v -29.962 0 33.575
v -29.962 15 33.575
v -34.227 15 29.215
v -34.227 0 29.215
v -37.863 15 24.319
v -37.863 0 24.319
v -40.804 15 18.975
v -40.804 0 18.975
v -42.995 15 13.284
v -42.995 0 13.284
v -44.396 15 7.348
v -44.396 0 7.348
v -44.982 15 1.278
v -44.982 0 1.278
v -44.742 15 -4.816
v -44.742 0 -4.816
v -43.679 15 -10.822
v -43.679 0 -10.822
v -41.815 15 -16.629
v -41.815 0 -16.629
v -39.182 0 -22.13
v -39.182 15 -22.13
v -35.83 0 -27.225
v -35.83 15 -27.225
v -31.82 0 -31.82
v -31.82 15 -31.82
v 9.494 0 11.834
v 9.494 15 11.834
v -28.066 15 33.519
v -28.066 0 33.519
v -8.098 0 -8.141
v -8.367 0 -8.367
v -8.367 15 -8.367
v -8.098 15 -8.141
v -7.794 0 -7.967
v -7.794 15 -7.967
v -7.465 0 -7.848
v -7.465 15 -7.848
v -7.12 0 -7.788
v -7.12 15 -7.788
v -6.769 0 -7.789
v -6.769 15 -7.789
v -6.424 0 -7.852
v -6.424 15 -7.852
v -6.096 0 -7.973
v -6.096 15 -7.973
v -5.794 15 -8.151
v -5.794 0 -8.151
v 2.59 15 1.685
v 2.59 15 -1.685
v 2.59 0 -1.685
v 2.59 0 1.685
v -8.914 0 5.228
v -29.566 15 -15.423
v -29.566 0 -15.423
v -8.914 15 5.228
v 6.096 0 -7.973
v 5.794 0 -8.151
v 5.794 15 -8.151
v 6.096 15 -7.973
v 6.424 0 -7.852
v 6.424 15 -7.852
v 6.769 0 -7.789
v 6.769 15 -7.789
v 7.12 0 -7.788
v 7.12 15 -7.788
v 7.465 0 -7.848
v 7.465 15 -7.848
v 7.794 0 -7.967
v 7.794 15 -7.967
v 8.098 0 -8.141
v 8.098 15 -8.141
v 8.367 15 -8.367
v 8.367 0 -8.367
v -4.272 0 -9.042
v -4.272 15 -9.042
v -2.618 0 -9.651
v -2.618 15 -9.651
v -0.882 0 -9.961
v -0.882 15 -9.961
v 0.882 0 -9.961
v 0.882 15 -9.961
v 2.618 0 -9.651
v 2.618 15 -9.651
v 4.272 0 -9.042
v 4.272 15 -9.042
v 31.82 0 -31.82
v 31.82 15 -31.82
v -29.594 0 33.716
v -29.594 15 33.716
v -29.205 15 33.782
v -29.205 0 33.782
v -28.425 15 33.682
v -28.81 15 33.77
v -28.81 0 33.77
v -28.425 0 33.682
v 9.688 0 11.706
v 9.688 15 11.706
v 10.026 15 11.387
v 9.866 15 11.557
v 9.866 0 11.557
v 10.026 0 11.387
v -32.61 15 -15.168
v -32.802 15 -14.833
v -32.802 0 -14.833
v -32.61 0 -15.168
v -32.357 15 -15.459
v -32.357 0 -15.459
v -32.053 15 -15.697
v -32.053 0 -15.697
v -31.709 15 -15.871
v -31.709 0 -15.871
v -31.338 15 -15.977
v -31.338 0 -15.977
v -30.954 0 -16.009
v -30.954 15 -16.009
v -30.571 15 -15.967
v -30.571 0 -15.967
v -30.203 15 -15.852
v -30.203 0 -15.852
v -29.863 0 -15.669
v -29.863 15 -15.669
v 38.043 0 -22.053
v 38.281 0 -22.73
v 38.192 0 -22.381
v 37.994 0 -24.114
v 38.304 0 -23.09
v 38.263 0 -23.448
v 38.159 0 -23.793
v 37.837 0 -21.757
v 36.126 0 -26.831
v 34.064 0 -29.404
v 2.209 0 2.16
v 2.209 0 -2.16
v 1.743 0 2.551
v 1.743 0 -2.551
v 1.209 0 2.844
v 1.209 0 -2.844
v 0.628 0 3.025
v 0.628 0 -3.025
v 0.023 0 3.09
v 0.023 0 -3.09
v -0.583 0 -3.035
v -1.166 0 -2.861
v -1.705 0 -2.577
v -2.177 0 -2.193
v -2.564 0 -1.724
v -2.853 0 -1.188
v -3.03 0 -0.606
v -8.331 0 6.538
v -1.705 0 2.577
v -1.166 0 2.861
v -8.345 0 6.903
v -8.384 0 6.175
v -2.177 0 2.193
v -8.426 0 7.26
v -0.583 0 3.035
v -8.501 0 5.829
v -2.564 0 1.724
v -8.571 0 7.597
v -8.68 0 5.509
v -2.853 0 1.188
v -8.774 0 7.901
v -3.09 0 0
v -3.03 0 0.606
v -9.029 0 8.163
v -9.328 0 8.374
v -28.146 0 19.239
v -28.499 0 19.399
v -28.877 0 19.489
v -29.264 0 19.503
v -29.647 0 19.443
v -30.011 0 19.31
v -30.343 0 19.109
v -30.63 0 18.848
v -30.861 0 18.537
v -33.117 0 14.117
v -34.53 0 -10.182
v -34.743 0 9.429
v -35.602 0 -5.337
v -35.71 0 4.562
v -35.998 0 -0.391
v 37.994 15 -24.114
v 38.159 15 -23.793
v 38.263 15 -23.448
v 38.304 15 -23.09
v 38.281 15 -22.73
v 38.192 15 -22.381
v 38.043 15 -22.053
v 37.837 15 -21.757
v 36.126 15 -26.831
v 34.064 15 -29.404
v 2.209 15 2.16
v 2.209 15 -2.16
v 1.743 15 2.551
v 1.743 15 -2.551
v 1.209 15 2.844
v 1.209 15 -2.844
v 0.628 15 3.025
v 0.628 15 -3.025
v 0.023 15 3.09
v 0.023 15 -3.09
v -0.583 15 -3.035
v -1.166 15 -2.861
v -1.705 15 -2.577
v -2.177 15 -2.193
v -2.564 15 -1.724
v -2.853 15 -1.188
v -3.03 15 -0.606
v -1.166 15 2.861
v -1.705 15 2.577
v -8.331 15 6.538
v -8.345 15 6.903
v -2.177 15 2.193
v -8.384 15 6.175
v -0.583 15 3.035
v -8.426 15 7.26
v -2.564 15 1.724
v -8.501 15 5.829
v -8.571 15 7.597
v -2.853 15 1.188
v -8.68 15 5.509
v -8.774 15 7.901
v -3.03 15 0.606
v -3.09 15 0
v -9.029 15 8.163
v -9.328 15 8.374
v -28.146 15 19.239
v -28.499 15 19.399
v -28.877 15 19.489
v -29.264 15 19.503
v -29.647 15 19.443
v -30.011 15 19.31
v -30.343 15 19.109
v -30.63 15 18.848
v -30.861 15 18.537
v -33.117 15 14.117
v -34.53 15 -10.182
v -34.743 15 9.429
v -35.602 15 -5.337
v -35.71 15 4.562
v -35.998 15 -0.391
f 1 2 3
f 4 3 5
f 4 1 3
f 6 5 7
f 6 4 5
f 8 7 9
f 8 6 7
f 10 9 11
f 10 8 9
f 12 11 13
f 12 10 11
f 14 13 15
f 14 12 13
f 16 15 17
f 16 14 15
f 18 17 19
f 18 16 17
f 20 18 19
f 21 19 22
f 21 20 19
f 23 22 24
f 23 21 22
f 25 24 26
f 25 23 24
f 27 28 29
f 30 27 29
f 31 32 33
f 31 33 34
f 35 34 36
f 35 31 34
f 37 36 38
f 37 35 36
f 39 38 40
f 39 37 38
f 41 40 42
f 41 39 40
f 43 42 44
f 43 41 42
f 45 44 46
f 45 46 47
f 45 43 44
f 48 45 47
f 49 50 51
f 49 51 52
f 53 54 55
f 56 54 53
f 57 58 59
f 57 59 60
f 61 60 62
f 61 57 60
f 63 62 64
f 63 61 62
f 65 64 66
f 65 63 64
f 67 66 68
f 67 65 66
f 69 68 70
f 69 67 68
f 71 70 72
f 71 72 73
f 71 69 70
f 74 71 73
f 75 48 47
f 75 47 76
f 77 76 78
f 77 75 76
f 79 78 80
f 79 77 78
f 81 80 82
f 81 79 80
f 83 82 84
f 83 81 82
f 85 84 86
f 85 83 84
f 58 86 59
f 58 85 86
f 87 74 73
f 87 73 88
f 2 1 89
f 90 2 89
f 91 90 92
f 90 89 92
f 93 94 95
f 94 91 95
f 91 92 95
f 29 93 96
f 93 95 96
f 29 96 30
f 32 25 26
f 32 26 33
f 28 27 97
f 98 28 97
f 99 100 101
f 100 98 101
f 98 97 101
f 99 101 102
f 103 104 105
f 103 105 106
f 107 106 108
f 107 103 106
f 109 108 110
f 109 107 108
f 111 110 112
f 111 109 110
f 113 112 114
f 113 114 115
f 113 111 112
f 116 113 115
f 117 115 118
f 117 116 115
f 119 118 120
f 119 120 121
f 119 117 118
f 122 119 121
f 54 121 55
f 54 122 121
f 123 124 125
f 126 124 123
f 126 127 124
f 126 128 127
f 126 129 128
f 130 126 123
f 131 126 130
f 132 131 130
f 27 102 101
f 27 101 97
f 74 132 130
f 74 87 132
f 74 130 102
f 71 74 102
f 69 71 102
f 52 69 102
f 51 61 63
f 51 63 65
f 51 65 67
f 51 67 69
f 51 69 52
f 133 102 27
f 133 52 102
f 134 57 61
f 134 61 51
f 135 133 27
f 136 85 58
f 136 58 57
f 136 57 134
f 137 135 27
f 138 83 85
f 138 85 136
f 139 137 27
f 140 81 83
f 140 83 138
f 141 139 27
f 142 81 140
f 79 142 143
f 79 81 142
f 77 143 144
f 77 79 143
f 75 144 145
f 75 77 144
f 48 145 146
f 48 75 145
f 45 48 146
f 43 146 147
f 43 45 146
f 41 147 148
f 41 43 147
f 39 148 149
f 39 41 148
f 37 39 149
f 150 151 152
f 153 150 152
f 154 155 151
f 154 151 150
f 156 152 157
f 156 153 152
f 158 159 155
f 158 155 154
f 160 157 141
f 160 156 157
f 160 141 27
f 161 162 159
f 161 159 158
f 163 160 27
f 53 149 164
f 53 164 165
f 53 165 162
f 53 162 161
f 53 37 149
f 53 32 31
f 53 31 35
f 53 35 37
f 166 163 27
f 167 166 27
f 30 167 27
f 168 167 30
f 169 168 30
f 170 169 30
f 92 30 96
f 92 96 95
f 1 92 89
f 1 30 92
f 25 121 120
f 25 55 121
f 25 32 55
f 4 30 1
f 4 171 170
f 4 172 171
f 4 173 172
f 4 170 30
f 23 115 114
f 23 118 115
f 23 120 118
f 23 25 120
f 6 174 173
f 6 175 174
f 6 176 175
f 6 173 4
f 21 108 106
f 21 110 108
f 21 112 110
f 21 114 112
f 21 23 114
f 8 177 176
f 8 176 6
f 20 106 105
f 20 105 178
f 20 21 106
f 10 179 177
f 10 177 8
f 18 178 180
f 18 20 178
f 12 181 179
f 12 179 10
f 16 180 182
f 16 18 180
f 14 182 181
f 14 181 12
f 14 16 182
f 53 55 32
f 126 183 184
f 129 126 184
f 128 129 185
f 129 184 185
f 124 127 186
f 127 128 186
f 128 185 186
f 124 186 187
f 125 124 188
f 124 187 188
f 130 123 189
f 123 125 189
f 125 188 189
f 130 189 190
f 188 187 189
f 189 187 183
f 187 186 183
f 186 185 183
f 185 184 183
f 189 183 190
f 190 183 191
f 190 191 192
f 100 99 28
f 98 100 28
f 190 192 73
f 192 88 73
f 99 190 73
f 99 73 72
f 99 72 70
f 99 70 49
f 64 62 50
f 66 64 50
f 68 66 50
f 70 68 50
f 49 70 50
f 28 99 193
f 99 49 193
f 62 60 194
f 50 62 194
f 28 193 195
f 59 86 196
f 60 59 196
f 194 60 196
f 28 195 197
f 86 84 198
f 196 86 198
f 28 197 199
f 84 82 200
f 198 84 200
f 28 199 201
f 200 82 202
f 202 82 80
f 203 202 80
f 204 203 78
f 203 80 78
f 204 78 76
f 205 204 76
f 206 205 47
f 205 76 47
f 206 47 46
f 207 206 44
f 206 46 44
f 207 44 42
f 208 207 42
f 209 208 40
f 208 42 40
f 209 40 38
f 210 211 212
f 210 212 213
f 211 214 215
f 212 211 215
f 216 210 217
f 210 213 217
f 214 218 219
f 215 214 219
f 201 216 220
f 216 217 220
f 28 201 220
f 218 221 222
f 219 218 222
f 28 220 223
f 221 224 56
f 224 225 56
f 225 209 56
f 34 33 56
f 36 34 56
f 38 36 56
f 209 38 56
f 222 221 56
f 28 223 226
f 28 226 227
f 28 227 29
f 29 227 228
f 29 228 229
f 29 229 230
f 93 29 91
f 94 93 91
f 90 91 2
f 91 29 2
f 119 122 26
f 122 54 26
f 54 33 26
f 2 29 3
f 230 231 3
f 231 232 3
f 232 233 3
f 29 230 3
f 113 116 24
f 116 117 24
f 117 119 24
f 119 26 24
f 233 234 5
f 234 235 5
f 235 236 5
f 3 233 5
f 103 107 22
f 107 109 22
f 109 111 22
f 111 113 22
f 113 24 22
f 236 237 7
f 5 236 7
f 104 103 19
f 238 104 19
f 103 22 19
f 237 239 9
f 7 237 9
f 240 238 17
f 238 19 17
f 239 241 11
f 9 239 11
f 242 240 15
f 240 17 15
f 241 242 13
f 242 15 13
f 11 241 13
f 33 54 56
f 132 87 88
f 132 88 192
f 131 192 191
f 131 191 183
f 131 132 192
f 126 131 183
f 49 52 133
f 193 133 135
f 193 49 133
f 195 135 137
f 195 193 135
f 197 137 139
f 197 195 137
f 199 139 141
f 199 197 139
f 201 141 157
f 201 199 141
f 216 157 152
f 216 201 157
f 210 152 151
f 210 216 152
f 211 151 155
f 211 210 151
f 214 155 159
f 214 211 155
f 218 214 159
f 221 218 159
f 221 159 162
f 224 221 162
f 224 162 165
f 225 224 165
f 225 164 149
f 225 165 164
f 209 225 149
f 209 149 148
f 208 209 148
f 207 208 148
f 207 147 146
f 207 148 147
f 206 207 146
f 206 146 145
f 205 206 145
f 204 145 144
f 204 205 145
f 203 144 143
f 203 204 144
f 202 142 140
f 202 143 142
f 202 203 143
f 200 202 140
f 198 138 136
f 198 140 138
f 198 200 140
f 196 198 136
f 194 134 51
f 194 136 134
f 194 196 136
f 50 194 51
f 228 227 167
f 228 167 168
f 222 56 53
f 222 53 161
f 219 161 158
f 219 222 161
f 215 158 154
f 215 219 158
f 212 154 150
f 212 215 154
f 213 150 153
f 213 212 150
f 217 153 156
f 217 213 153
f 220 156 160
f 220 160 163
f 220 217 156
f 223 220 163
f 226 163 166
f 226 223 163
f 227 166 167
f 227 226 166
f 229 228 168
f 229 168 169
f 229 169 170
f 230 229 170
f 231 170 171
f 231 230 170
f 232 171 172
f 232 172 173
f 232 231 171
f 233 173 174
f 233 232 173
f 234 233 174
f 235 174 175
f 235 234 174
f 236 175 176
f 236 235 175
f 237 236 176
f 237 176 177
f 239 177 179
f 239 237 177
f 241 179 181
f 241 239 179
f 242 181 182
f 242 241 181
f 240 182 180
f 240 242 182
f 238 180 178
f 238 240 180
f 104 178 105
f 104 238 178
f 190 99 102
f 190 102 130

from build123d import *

# Parameters (mm, degrees)
SKETCH1_R                  = 3
BOSS_EXTRUDE1_DEPTH        = 15
SHAFT_START                = -15
SHAFT_D_DEPTH              = 15
CUT_EXTRUDE1_DEPTH         = 66.3834841531101
BOSS_EXTRUDE3_DEPTH        = 0.9
CUT_EXTRUDE2_DEPTH         = 59.56795722653927
SHAFT_HOLE_EXPANSION_DEPTH = 59.56795722653927
CUT_EXTRUDE4_DEPTH         = 59.56795722653927
FILLET1_R                  = 2


with BuildPart() as part:
    # Sketch1 → Boss-Extrude1 (new body)
    with BuildSketch(Plane(origin=(0, 0, 0), x_dir=(1, 0, 0), z_dir=(0, 1, 0))):
        with BuildLine():
            Line((-31.81980515339447, 31.819805153394796), (-7.071067811865444, 7.071067811865506))
            ThreePointArc((-7.071067811865444, 7.071067811865506), (4.724e-14, 10.000000000000002), (7.071067811865511, 7.071067811865442))
            Line((7.071067811865511, 7.071067811865442), (31.819805153394796, 31.819805153394476))
            ThreePointArc((31.819805153394796, 31.819805153394476), (-2.4807e-13, -44.99999999999999), (-31.81980515339447, 31.819805153394796))
        make_face()
        with Locations(Location((0, 0, 0), (0, 0, 270))):
            Circle(SKETCH1_R, mode=Mode.SUBTRACT)
    extrude(amount=BOSS_EXTRUDE1_DEPTH)

    # Sketch2 → Shaft D (add)
    with BuildSketch(Plane(origin=(0, 15, 0), x_dir=(1, 0, 0), z_dir=(0, 1, 0)).offset(SHAFT_START)):
        with BuildLine():
            Line((2.499999999999999, 1.6583123951777017), (2.499999999999999, -1.6583123951777017))
            ThreePointArc((2.499999999999999, -1.6583123951777017), (3.0000000000000004, 0), (2.499999999999999, 1.6583123951777017))
        make_face()
    extrude(amount=SHAFT_D_DEPTH)

    # Sketch4 → Cut-Extrude1 (cut, through all)
    with BuildSketch(Plane(origin=(0, 15, 0), x_dir=(1, 0, 0), z_dir=(0, 1, 0))):
        with BuildLine():
            Line((11.490666646784653, -9.641814145298108), (45.50378986806941, 30.893447649017453))
            ThreePointArc((45.50378986806941, 30.893447649017453), (34.99275019793601, -42.43238661193652), (-38.99293957205545, -38.78853778540811))
            Line((-38.99293957205545, -38.78853778540811), (11.490666646784653, -9.641814145298108))
        make_face()
    extrude(amount=-CUT_EXTRUDE1_DEPTH, mode=Mode.SUBTRACT)

    # Sketch6 → Boss-Extrude3 (add)
    with BuildSketch(Plane(origin=(7.0476946558942295, 0, 12.206965220240622), x_dir=(0.8660254037844414, 0, -0.4999999999999952), z_dir=(0.4999999999999952, 0, 0.8660254037844414))):
        Polygon((-42.73546536717619, 15), (5.130302149885087, 15), (5.130302149885089, 0), (-42.73546536717619, 0), align=None)
    extrude(amount=BOSS_EXTRUDE3_DEPTH)

    # Sketch7 → Cut-Extrude2 (cut, through all)
    with BuildSketch(Plane(origin=(0, 15, 0), x_dir=(1, 0, 0), z_dir=(0, 1, 0))):
        with BuildLine():
            Line((-31.525106333140414, 17.38297070940953), (-7.071067811865441, -7.07106781186544))
            Line((-7.071067811865441, -7.07106781186544), (-29.802141727564482, -20.19485945606356))
            ThreePointArc((-29.802141727564482, -20.19485945606356), (-35.962218628181056, -1.6488879097460596), (-31.525106333140414, 17.38297070940953))
        make_face()
    extrude(amount=-CUT_EXTRUDE2_DEPTH, mode=Mode.SUBTRACT)

    # Sketch9 → Shaft Hole Expansion (cut, through all)
    with BuildSketch(Plane(origin=(0, 15, 0), x_dir=(1, 0, 0), z_dir=(0, 1, 0))):
        with BuildLine():
            Line((2.5899999999999985, 1.685229954635274), (2.5899999999999985, -1.6852299546352736))
            ThreePointArc((2.5899999999999985, -1.6852299546352736), (-3.09, 3.8e-16), (2.5899999999999985, 1.685229954635274))
        make_face()
    extrude(amount=-SHAFT_HOLE_EXPANSION_DEPTH, mode=Mode.SUBTRACT)

    # Sketch10 → Cut-Extrude4 (cut, through all)
    with BuildSketch(Plane(origin=(0, 15, 0), x_dir=(1, 0, 0), z_dir=(0, 1, 0))):
        Polygon((11.49066664678465, -9.641814145298104), (7.493411323151681, -14.405557537754012), (21.666837443070385, -15.28946640390601), align=None)
    extrude(amount=-CUT_EXTRUDE4_DEPTH, mode=Mode.SUBTRACT)

    # Fillet1
    # the kernel refuses this fillet: 2 mm, written as the material it adds along each edge
    with BuildSketch(Plane(origin=(-29.802141727564482, 15, 20.19485945606356), x_dir=(0.8660254037844384, 0, -0.5000000000000004), z_dir=(0, -1, 0))) as fillet1_piece_1:
        with BuildLine():
            CenterArc((1.9119296968147805, -2.000000000000001), FILLET1_R, 90.00000000000006, 89.00874965826159)
            ThreePointArc((-0.08777100050710222, -1.9654005617043746), (-0.05731387291771985, -0.9821005956140282), (0, 0))
            Line((0, 0), (1.911929696814779, 4e-17))
        make_face()
    extrude(amount=15)
    with BuildSketch(Plane(origin=(-31.525106333140414, 15, -17.382970709409527), x_dir=(-0.44779859611608247, 0, 0.8941344514760997), z_dir=(0, -1, 0))) as fillet1_piece_2:
        with BuildLine():
            CenterArc((2.77241732034655, -1.9984307521616007), FILLET1_R, 87.73015185982399, 110.66731649351249)
            Line((0.8746374046450249, -2.6296449721851296), (0, 0))
            ThreePointArc((0, 0), (1.4258146218925176, 0.02824646109120102), (2.8516292437850255, 6e-17))
        make_face()
    extrude(amount=15)
    with BuildSketch(Plane(origin=(-7.071067811865441, 15, 7.07106781186544), x_dir=(-0.8660254037844387, 0, 0.4999999999999999), z_dir=(0, -1, 0))) as fillet1_piece_3:
        with BuildLine():
            CenterArc((FILLET1_R * 1.30322537284, FILLET1_R), FILLET1_R, 165.00000000000003, 104.99999999999997)
            Line((FILLET1_R * 0.337299546552, FILLET1_R * 1.2588190451), (0, 0))
            Line((0, 0), (FILLET1_R * 1.30322537284, 1e-17))
        make_face()
    extrude(amount=15)
    with BuildSketch(Plane(origin=(-7.071067811865445, 0, -7.071067811865506), x_dir=(-0.7071067811865437, 0, -0.7071067811865515), z_dir=(0, 1, 0))) as fillet1_piece_4:
        with BuildLine():
            CenterArc((1.8321595661992367, -2), FILLET1_R, 89.99999999999999, 80.40593177313956)
            ThreePointArc((-0.13986702816730157, -1.666666666666667), (-0.0350281054503974, -0.8362626027968331), (0, 0))
            Line((0, 0), (1.8321595661992371, 5e-17))
        make_face()
    extrude(amount=15)
    with BuildSketch(Plane(origin=(7.071067811865512, 0, -7.071067811865442), x_dir=(0.7071067811865507, 0, -0.7071067811865444), z_dir=(0, 1, 0))) as fillet1_piece_5:
        with BuildLine():
            CenterArc((1.8321595661992343, 2.0000000000000004), FILLET1_R, 189.59406822686037, 80.40593177313957)
            ThreePointArc((-0.139867028167305, 1.6666666666666698), (-0.03502810545039883, 0.8362626027968333), (0, 0))
            Line((0, 0), (1.8321595661992325, 4e-17))
        make_face()
    extrude(amount=15)
    # the kernel refuses this fillet: 2 mm, written as the material it takes off along each edge
    with BuildSketch(Plane(origin=(-29.512303994630546, -4.175823272127531, 34.35412076723451), x_dir=(-0.49999999999865496, 0, -0.8660254037852152), z_dir=(0, 1, 0))) as fillet1_2_piece_1:
        with BuildLine():
            CenterArc((2.0000000000025833, -1.6703293088479174), FILLET1_R, 123.36701296928852, 56.63298703080011)
            Line((2.58454e-12, -1.6703293088510118), (0, 0))
            Line((0, 0), (0.9000000000009275, 2e-17))
        make_face()
    extrude(amount=23.35164654425506, mode=Mode.SUBTRACT)
    with BuildSketch(Plane(origin=(9.799219929370043, -0.8816349035423467, 11.657601847458647), x_dir=(0.6427876096865316, 0, -0.7660444431189845), z_dir=(0, 1, 0))) as fillet1_2_piece_2:
        with BuildLine():
            CenterArc((FILLET1_R * 0.176326980708, FILLET1_R), FILLET1_R, 249.99999999999906, 20.000000000000284)
            Line((-FILLET1_R * 0.165693162617, FILLET1_R * 0.0603073792141), (0, 0))
            Line((0, 0), (FILLET1_R * 0.176326980708, 1e-17))
        make_face()
    extrude(amount=16.763269807084693, mode=Mode.SUBTRACT)
    with BuildSketch(Plane(origin=(38.76183530710732, 18.67919870008775, -22.858699079883973), x_dir=(-0.5219883581091025, 0, -0.8529526094681715), z_dir=(0, -1, 0))) as fillet1_2_piece_3:
        with BuildLine():
            CenterArc((1.4389754915898811, -1.9997325944085071), FILLET1_R, 89.06305798679442, 72.40266339187922)
            Line((-0.45729180864609936, -1.363988678939587), (0, 0))
            ThreePointArc((0, 0), (0.7358397400175548, 0.00601662580861232), (1.4716794800350999, 0))
        make_face()
    extrude(amount=22.3583974001755, mode=Mode.SUBTRACT)


solid = part.part
